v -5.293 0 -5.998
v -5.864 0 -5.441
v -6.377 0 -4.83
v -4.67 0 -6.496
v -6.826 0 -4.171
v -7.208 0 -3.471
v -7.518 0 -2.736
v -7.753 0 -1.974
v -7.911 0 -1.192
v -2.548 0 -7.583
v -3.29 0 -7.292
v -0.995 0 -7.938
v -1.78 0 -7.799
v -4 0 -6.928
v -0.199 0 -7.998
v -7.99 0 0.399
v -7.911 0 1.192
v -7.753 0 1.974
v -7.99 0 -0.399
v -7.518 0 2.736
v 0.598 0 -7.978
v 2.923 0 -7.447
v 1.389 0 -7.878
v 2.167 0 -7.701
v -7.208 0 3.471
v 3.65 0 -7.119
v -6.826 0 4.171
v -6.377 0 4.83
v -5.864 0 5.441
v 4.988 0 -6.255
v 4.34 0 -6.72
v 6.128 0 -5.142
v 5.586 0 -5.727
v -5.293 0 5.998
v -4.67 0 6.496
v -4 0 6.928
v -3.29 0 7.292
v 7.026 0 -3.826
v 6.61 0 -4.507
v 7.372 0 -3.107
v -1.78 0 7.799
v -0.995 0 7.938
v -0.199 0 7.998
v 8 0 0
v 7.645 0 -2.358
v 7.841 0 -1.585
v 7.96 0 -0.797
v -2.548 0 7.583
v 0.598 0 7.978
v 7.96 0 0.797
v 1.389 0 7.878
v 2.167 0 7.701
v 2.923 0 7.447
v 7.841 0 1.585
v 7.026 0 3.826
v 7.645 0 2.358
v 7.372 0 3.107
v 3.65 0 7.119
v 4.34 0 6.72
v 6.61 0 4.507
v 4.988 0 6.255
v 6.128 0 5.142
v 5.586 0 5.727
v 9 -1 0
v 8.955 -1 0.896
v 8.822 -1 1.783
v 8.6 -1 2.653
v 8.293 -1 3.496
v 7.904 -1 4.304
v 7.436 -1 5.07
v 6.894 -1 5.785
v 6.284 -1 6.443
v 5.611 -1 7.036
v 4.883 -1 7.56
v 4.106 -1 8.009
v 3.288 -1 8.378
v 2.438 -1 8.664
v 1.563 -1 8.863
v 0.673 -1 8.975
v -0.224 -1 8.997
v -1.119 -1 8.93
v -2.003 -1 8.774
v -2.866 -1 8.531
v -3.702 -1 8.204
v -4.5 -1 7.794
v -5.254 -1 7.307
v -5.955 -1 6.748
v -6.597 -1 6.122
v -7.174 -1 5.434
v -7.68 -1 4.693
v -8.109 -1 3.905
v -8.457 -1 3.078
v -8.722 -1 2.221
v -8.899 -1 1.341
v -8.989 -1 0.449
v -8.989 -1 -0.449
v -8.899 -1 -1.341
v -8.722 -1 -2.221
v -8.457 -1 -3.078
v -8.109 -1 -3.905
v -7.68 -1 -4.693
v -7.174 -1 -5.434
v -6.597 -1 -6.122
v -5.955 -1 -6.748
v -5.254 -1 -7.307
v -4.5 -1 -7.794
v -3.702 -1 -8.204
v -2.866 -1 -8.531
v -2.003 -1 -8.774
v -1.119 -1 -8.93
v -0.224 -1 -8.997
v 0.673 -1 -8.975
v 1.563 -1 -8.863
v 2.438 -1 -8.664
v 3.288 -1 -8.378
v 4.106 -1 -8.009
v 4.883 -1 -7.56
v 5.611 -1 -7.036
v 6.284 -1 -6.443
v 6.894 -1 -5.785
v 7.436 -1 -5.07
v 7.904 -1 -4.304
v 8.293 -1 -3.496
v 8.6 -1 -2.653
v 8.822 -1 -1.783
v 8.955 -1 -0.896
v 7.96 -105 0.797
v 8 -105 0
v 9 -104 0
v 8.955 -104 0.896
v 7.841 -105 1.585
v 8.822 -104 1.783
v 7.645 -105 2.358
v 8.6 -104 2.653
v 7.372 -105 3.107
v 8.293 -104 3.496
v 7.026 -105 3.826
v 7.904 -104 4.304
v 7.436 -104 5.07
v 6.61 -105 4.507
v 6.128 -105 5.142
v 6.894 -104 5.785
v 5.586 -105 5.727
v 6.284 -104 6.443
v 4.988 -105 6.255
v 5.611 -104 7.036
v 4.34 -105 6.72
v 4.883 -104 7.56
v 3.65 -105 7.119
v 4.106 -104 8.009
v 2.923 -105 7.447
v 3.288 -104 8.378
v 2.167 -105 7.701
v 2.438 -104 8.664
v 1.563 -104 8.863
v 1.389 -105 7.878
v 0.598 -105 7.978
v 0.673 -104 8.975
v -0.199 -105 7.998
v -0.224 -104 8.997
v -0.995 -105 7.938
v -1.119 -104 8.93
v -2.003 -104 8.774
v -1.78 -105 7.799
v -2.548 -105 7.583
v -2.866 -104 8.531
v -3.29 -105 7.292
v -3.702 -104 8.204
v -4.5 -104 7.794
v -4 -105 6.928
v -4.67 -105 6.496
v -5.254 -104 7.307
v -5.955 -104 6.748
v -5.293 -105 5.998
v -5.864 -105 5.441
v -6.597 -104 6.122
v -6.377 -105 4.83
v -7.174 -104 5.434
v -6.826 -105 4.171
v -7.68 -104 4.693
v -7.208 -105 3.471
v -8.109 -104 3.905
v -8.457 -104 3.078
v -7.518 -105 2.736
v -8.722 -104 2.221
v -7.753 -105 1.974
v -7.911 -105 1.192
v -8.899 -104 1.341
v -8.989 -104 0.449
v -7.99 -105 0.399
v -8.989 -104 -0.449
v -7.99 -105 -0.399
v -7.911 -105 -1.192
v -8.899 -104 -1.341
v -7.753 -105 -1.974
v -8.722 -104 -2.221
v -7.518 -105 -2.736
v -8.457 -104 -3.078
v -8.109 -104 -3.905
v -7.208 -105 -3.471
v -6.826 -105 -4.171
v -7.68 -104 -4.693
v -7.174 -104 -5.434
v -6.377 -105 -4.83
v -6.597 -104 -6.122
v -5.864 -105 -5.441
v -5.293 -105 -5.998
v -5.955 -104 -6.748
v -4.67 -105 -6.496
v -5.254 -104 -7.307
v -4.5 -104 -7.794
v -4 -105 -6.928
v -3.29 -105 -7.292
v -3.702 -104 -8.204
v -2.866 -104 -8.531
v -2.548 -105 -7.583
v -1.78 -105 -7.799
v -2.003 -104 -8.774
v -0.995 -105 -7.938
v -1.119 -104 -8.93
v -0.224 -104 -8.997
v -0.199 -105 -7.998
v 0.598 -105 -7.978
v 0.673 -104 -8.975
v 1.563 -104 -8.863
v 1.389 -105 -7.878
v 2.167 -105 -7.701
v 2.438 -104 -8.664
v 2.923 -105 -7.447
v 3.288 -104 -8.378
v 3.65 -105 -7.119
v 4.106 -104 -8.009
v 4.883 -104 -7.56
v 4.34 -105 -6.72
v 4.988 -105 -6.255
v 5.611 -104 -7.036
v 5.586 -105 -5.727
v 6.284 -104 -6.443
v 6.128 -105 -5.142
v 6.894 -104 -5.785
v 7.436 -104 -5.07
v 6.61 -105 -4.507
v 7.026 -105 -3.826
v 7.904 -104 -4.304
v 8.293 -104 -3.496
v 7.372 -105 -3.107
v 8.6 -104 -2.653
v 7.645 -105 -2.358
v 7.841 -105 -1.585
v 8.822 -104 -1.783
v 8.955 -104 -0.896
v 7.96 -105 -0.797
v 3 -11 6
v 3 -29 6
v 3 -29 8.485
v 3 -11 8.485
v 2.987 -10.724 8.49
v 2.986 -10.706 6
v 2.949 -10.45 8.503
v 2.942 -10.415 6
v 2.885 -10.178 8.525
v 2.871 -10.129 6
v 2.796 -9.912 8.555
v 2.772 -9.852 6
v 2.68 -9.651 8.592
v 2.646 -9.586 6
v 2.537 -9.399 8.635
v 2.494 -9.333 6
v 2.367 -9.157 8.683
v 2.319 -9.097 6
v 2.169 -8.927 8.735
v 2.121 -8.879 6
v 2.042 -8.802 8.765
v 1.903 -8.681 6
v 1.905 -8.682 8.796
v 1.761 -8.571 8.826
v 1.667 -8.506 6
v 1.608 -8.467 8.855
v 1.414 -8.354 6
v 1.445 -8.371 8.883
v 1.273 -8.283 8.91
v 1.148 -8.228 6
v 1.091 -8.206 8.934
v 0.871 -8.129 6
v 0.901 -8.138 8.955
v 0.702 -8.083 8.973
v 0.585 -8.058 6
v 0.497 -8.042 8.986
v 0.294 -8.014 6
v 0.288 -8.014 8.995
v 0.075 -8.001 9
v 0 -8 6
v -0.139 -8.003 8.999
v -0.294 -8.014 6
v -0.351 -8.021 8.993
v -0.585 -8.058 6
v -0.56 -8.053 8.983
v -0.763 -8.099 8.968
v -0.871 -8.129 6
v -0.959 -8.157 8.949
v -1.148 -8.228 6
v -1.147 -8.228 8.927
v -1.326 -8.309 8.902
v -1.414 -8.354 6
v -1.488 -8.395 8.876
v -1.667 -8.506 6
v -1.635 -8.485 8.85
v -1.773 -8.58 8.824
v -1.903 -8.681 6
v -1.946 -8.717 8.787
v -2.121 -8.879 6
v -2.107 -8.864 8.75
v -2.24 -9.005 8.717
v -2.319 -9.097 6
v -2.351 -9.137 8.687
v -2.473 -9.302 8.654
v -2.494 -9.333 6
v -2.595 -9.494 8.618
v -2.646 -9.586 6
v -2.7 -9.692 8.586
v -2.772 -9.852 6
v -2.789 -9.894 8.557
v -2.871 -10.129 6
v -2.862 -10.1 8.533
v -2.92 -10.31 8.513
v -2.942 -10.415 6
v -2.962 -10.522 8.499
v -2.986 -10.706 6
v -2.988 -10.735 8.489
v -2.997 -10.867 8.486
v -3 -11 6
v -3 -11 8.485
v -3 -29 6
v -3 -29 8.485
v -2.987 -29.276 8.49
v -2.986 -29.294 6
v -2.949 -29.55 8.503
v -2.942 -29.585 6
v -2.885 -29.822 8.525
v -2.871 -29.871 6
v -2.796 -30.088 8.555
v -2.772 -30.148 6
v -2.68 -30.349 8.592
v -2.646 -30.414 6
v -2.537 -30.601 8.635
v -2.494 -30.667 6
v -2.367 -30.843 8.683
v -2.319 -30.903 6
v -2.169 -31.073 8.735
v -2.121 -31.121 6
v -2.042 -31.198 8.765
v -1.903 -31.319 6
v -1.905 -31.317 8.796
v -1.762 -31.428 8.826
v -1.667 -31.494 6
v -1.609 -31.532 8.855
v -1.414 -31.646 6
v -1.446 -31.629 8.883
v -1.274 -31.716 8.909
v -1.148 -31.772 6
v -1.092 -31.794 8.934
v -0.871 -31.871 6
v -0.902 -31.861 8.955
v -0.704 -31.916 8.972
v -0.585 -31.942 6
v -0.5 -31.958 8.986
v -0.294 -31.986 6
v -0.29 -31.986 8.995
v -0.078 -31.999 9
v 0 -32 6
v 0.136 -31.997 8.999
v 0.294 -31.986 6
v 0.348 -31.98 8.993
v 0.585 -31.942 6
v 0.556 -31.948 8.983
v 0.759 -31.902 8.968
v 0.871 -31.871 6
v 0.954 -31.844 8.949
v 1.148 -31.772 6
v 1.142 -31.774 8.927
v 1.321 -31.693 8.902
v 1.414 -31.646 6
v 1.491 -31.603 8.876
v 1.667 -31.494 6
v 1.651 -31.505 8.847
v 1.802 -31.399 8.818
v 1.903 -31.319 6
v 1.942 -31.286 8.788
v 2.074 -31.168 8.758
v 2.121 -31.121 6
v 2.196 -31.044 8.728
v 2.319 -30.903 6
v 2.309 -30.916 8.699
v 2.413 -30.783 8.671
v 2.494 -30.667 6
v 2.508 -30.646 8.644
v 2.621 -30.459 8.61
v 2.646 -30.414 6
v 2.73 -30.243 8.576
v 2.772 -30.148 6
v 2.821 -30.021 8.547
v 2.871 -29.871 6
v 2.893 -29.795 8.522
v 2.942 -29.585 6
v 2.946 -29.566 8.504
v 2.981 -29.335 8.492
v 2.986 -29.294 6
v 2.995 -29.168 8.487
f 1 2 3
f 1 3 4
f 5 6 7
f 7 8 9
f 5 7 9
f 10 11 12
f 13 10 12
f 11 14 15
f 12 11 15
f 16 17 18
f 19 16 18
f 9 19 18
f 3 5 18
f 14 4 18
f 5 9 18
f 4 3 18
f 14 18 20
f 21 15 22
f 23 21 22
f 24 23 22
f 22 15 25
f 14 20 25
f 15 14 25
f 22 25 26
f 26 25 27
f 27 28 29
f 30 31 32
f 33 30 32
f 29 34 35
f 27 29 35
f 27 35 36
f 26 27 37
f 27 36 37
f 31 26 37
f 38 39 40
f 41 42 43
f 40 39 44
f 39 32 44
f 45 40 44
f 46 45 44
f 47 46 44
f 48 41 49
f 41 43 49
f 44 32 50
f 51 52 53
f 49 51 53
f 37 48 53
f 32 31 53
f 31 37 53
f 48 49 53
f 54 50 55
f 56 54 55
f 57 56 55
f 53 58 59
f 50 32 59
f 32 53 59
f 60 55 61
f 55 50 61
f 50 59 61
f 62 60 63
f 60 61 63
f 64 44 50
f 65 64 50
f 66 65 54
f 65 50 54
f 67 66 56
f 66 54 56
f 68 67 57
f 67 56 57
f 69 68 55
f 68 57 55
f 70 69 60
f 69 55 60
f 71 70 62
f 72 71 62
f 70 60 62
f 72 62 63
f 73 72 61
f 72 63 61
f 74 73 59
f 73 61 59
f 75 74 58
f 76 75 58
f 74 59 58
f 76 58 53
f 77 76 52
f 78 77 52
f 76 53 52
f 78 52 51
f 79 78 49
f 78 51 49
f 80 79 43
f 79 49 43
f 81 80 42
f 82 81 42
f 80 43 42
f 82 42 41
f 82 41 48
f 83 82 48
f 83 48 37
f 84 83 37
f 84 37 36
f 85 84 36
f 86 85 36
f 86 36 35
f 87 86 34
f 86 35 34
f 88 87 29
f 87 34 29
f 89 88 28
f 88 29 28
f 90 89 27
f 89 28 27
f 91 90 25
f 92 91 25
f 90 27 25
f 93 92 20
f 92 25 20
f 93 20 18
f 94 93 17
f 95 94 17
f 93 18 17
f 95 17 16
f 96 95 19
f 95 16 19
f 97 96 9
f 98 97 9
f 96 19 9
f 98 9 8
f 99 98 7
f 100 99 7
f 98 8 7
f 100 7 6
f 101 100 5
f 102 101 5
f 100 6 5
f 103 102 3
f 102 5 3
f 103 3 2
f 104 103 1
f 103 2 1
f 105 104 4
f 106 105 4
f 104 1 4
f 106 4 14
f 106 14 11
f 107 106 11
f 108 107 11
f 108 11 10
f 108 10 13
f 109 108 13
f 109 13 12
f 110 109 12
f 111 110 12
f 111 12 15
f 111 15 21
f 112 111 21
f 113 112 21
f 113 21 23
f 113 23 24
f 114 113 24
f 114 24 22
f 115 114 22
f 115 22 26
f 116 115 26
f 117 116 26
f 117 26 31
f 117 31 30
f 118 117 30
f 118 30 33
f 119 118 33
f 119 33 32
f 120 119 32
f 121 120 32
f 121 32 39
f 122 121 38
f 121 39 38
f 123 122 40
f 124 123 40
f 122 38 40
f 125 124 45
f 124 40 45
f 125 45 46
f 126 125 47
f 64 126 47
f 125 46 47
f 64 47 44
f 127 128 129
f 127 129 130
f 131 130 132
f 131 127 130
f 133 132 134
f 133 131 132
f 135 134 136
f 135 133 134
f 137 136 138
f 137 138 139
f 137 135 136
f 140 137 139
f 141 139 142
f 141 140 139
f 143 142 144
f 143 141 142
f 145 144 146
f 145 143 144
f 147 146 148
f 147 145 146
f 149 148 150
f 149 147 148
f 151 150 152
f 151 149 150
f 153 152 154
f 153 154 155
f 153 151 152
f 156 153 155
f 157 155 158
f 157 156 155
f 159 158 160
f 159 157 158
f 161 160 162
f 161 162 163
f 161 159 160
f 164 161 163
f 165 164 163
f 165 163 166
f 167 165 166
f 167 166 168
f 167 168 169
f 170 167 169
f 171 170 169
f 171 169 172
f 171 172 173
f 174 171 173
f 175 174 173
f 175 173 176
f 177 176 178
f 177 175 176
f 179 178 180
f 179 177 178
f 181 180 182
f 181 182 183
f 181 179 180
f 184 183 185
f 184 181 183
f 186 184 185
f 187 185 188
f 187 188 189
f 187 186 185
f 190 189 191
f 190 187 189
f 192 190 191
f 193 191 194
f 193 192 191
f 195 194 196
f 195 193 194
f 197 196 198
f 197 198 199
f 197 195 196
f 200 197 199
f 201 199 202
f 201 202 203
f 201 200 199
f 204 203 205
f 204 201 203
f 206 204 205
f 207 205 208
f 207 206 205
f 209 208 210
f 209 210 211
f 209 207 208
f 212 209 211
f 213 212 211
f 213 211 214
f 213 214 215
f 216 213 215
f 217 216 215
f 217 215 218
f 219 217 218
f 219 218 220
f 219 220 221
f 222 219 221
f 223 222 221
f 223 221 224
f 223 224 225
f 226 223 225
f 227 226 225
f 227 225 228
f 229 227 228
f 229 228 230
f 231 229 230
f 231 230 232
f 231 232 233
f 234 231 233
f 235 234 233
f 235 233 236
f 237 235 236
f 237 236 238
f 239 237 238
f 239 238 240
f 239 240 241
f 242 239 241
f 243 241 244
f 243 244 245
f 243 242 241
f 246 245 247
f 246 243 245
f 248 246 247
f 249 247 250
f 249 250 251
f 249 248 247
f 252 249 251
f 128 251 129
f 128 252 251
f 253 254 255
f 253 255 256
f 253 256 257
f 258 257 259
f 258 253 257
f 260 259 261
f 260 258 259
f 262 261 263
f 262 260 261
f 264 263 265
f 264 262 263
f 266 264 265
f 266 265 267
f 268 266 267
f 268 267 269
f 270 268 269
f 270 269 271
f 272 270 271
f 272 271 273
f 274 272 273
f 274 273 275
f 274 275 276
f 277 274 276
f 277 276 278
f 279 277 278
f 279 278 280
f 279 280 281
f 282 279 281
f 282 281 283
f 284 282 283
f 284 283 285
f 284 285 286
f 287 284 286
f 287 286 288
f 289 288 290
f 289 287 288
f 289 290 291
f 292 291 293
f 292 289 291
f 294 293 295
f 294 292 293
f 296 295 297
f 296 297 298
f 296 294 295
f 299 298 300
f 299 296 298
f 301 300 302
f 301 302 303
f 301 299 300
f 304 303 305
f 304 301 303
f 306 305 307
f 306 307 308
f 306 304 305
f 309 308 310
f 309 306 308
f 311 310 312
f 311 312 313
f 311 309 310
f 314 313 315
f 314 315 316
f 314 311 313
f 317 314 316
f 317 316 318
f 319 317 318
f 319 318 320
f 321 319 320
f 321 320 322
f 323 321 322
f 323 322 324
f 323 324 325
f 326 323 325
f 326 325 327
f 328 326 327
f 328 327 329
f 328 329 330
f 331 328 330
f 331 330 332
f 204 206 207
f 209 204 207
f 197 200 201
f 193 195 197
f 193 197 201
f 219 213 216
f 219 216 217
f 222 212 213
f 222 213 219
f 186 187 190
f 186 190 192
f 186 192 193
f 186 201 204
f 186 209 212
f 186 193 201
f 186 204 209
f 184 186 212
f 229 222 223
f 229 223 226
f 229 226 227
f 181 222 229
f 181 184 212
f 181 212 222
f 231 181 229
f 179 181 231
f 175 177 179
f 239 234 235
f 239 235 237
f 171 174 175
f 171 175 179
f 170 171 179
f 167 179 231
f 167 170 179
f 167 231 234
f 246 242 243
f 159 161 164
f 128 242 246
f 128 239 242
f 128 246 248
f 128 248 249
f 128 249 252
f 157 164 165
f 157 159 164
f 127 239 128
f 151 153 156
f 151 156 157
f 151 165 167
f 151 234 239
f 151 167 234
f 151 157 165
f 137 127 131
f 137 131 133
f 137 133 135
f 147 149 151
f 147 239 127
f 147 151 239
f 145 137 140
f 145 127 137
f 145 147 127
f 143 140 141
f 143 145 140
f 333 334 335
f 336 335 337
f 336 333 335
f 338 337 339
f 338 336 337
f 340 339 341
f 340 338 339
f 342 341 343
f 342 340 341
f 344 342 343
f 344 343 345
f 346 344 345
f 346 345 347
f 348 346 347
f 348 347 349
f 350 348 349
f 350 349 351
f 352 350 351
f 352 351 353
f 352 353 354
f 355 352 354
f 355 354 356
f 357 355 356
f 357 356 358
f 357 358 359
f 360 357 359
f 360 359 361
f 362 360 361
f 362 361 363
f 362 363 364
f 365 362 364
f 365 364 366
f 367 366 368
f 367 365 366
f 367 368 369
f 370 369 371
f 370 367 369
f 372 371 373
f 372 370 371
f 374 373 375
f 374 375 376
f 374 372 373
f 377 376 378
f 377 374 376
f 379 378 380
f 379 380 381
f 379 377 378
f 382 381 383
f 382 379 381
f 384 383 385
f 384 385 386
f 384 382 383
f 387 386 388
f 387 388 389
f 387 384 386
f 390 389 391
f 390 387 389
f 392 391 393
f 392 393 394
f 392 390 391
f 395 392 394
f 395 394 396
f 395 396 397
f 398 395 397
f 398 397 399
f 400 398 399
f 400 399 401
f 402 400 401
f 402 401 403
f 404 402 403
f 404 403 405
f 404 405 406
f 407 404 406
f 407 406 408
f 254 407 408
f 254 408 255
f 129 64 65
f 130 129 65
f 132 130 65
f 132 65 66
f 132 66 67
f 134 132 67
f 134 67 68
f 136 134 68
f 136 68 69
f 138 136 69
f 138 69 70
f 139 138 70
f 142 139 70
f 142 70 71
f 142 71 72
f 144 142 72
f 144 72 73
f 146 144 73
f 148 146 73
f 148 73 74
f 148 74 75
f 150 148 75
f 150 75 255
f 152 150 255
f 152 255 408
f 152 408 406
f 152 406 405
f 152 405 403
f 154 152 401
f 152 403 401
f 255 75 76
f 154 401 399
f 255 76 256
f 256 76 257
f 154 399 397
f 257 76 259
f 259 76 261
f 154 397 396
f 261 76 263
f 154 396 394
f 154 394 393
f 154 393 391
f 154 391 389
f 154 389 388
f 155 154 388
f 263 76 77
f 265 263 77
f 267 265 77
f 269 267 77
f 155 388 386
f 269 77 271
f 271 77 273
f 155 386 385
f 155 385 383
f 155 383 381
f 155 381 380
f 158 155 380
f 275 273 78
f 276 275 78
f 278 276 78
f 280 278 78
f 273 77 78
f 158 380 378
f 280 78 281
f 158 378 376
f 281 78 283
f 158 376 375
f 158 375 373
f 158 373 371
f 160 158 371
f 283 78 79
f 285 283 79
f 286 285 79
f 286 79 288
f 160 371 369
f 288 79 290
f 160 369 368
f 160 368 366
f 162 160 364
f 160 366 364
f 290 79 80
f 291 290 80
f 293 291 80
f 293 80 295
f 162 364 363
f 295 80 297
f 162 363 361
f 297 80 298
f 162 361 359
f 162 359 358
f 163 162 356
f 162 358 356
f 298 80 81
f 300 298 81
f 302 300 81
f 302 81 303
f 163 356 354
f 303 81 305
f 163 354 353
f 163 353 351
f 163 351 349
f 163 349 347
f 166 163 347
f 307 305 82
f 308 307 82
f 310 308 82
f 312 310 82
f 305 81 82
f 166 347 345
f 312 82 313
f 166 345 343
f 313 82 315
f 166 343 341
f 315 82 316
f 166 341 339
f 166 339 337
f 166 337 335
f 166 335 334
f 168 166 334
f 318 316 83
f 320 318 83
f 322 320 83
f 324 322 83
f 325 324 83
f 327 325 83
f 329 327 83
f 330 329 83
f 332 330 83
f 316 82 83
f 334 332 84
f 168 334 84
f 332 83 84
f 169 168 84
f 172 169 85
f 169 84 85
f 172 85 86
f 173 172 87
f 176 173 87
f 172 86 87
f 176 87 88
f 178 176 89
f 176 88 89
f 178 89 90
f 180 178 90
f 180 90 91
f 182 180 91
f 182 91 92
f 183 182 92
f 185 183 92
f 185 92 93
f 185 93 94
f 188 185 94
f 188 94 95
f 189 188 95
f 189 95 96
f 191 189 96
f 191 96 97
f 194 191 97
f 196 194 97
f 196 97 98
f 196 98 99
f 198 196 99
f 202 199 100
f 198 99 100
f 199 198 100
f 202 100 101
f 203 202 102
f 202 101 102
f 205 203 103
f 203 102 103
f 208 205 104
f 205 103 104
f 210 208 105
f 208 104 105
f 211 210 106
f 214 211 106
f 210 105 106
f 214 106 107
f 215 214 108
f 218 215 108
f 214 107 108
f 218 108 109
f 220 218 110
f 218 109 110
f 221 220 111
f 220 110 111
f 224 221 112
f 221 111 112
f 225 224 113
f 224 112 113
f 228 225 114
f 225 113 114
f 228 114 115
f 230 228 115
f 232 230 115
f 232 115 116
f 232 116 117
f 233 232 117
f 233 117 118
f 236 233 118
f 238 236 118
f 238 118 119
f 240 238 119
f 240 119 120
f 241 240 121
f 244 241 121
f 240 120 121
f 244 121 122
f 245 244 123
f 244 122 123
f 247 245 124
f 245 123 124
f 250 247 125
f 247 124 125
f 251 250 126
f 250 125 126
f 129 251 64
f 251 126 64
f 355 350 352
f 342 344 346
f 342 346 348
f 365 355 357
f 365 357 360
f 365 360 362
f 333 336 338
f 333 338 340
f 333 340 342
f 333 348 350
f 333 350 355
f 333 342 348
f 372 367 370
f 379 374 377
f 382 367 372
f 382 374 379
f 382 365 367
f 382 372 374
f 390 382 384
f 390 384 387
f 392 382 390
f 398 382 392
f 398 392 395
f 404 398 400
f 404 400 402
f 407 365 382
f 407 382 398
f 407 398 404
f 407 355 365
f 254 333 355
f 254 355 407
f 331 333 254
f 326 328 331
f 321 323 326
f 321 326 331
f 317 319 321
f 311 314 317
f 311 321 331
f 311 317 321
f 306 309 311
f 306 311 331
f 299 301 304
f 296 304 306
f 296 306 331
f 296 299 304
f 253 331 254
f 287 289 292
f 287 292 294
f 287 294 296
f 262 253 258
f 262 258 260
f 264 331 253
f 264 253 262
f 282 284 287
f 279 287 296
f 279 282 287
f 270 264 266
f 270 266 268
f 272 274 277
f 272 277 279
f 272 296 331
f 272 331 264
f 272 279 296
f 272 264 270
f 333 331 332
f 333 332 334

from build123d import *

# Parameters (mm, degrees)
F0_R     = 9
F1_DEPTH = 105
F2_SIZE  = 1
F5_DEPTH = 25


with BuildPart() as f1:
    # F0 (on Front) → F1 (new body)
    with BuildSketch(Plane.XZ):
        Circle(F0_R)
    extrude(amount=F1_DEPTH)

    # F2
    f2_edges = [f1.edges().sort_by_distance(p)[0] for p in [
        (9, -52.5, 0),
        (-9, 0, 0),
        (-9, -105, 0),
    ]]
    chamfer(f2_edges, length=F2_SIZE)

    # F4 (on offset) → F5 (cut)
    with BuildSketch(Plane.XY.offset(6)):
        with BuildLine():
            Line((3, -29), (3, -11))
            ThreePointArc((3, -11), (0, -8), (-3, -11))
            Line((-3, -11), (-3, -29))
            ThreePointArc((-3, -29), (0, -32), (3, -29))
        make_face()
    extrude(amount=F5_DEPTH, mode=Mode.SUBTRACT)


solid = f1.part
